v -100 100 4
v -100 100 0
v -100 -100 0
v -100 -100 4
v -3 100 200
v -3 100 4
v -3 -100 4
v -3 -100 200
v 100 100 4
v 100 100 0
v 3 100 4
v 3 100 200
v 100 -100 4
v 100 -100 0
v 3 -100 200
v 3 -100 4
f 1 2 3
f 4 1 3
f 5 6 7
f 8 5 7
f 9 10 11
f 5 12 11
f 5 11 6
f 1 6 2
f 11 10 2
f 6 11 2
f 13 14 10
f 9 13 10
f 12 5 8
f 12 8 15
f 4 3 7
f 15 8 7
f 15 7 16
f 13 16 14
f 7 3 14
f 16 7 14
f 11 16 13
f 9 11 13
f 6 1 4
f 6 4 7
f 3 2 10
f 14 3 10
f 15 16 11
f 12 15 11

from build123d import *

# Parameters (mm, degrees)
SZKIC1_W                    = 100
SZKIC1_H                    = 100
DODANIE_WYCI_GNI_CIE1_DEPTH = 4
SZKIC2_W                    = 3
SZKIC2_H                    = 100
DODANIE_WYCI_GNI_CIE2_DEPTH = 196


with BuildPart() as part:
    # Szkic1 → Dodanie-wyciągnięcie1 (new body)
    with BuildSketch(Plane.XY):
        with Locations((-50, 50)):
            Rectangle(SZKIC1_W, SZKIC1_H)
        with Locations((50, 50)):
            Rectangle(SZKIC1_W, SZKIC1_H)
        with Locations((50, -50)):
            Rectangle(SZKIC1_W, SZKIC1_H)
        with Locations((-50, -50)):
            Rectangle(SZKIC1_W, SZKIC1_H)
    extrude(amount=DODANIE_WYCI_GNI_CIE1_DEPTH)

    # Szkic2 → Dodanie-wyciągnięcie2 (add)
    with BuildSketch(Plane.XY.offset(4)):
        with Locations((-1.5, 50)):
            Rectangle(SZKIC2_W, SZKIC2_H)
        with Locations((1.5, 50)):
            Rectangle(SZKIC2_W, SZKIC2_H)
        with Locations((-1.5, -50)):
            Rectangle(SZKIC2_W, SZKIC2_H)
        with Locations((1.5, -50)):
            Rectangle(SZKIC2_W, SZKIC2_H)
    extrude(amount=DODANIE_WYCI_GNI_CIE2_DEPTH)


solid = part.part
